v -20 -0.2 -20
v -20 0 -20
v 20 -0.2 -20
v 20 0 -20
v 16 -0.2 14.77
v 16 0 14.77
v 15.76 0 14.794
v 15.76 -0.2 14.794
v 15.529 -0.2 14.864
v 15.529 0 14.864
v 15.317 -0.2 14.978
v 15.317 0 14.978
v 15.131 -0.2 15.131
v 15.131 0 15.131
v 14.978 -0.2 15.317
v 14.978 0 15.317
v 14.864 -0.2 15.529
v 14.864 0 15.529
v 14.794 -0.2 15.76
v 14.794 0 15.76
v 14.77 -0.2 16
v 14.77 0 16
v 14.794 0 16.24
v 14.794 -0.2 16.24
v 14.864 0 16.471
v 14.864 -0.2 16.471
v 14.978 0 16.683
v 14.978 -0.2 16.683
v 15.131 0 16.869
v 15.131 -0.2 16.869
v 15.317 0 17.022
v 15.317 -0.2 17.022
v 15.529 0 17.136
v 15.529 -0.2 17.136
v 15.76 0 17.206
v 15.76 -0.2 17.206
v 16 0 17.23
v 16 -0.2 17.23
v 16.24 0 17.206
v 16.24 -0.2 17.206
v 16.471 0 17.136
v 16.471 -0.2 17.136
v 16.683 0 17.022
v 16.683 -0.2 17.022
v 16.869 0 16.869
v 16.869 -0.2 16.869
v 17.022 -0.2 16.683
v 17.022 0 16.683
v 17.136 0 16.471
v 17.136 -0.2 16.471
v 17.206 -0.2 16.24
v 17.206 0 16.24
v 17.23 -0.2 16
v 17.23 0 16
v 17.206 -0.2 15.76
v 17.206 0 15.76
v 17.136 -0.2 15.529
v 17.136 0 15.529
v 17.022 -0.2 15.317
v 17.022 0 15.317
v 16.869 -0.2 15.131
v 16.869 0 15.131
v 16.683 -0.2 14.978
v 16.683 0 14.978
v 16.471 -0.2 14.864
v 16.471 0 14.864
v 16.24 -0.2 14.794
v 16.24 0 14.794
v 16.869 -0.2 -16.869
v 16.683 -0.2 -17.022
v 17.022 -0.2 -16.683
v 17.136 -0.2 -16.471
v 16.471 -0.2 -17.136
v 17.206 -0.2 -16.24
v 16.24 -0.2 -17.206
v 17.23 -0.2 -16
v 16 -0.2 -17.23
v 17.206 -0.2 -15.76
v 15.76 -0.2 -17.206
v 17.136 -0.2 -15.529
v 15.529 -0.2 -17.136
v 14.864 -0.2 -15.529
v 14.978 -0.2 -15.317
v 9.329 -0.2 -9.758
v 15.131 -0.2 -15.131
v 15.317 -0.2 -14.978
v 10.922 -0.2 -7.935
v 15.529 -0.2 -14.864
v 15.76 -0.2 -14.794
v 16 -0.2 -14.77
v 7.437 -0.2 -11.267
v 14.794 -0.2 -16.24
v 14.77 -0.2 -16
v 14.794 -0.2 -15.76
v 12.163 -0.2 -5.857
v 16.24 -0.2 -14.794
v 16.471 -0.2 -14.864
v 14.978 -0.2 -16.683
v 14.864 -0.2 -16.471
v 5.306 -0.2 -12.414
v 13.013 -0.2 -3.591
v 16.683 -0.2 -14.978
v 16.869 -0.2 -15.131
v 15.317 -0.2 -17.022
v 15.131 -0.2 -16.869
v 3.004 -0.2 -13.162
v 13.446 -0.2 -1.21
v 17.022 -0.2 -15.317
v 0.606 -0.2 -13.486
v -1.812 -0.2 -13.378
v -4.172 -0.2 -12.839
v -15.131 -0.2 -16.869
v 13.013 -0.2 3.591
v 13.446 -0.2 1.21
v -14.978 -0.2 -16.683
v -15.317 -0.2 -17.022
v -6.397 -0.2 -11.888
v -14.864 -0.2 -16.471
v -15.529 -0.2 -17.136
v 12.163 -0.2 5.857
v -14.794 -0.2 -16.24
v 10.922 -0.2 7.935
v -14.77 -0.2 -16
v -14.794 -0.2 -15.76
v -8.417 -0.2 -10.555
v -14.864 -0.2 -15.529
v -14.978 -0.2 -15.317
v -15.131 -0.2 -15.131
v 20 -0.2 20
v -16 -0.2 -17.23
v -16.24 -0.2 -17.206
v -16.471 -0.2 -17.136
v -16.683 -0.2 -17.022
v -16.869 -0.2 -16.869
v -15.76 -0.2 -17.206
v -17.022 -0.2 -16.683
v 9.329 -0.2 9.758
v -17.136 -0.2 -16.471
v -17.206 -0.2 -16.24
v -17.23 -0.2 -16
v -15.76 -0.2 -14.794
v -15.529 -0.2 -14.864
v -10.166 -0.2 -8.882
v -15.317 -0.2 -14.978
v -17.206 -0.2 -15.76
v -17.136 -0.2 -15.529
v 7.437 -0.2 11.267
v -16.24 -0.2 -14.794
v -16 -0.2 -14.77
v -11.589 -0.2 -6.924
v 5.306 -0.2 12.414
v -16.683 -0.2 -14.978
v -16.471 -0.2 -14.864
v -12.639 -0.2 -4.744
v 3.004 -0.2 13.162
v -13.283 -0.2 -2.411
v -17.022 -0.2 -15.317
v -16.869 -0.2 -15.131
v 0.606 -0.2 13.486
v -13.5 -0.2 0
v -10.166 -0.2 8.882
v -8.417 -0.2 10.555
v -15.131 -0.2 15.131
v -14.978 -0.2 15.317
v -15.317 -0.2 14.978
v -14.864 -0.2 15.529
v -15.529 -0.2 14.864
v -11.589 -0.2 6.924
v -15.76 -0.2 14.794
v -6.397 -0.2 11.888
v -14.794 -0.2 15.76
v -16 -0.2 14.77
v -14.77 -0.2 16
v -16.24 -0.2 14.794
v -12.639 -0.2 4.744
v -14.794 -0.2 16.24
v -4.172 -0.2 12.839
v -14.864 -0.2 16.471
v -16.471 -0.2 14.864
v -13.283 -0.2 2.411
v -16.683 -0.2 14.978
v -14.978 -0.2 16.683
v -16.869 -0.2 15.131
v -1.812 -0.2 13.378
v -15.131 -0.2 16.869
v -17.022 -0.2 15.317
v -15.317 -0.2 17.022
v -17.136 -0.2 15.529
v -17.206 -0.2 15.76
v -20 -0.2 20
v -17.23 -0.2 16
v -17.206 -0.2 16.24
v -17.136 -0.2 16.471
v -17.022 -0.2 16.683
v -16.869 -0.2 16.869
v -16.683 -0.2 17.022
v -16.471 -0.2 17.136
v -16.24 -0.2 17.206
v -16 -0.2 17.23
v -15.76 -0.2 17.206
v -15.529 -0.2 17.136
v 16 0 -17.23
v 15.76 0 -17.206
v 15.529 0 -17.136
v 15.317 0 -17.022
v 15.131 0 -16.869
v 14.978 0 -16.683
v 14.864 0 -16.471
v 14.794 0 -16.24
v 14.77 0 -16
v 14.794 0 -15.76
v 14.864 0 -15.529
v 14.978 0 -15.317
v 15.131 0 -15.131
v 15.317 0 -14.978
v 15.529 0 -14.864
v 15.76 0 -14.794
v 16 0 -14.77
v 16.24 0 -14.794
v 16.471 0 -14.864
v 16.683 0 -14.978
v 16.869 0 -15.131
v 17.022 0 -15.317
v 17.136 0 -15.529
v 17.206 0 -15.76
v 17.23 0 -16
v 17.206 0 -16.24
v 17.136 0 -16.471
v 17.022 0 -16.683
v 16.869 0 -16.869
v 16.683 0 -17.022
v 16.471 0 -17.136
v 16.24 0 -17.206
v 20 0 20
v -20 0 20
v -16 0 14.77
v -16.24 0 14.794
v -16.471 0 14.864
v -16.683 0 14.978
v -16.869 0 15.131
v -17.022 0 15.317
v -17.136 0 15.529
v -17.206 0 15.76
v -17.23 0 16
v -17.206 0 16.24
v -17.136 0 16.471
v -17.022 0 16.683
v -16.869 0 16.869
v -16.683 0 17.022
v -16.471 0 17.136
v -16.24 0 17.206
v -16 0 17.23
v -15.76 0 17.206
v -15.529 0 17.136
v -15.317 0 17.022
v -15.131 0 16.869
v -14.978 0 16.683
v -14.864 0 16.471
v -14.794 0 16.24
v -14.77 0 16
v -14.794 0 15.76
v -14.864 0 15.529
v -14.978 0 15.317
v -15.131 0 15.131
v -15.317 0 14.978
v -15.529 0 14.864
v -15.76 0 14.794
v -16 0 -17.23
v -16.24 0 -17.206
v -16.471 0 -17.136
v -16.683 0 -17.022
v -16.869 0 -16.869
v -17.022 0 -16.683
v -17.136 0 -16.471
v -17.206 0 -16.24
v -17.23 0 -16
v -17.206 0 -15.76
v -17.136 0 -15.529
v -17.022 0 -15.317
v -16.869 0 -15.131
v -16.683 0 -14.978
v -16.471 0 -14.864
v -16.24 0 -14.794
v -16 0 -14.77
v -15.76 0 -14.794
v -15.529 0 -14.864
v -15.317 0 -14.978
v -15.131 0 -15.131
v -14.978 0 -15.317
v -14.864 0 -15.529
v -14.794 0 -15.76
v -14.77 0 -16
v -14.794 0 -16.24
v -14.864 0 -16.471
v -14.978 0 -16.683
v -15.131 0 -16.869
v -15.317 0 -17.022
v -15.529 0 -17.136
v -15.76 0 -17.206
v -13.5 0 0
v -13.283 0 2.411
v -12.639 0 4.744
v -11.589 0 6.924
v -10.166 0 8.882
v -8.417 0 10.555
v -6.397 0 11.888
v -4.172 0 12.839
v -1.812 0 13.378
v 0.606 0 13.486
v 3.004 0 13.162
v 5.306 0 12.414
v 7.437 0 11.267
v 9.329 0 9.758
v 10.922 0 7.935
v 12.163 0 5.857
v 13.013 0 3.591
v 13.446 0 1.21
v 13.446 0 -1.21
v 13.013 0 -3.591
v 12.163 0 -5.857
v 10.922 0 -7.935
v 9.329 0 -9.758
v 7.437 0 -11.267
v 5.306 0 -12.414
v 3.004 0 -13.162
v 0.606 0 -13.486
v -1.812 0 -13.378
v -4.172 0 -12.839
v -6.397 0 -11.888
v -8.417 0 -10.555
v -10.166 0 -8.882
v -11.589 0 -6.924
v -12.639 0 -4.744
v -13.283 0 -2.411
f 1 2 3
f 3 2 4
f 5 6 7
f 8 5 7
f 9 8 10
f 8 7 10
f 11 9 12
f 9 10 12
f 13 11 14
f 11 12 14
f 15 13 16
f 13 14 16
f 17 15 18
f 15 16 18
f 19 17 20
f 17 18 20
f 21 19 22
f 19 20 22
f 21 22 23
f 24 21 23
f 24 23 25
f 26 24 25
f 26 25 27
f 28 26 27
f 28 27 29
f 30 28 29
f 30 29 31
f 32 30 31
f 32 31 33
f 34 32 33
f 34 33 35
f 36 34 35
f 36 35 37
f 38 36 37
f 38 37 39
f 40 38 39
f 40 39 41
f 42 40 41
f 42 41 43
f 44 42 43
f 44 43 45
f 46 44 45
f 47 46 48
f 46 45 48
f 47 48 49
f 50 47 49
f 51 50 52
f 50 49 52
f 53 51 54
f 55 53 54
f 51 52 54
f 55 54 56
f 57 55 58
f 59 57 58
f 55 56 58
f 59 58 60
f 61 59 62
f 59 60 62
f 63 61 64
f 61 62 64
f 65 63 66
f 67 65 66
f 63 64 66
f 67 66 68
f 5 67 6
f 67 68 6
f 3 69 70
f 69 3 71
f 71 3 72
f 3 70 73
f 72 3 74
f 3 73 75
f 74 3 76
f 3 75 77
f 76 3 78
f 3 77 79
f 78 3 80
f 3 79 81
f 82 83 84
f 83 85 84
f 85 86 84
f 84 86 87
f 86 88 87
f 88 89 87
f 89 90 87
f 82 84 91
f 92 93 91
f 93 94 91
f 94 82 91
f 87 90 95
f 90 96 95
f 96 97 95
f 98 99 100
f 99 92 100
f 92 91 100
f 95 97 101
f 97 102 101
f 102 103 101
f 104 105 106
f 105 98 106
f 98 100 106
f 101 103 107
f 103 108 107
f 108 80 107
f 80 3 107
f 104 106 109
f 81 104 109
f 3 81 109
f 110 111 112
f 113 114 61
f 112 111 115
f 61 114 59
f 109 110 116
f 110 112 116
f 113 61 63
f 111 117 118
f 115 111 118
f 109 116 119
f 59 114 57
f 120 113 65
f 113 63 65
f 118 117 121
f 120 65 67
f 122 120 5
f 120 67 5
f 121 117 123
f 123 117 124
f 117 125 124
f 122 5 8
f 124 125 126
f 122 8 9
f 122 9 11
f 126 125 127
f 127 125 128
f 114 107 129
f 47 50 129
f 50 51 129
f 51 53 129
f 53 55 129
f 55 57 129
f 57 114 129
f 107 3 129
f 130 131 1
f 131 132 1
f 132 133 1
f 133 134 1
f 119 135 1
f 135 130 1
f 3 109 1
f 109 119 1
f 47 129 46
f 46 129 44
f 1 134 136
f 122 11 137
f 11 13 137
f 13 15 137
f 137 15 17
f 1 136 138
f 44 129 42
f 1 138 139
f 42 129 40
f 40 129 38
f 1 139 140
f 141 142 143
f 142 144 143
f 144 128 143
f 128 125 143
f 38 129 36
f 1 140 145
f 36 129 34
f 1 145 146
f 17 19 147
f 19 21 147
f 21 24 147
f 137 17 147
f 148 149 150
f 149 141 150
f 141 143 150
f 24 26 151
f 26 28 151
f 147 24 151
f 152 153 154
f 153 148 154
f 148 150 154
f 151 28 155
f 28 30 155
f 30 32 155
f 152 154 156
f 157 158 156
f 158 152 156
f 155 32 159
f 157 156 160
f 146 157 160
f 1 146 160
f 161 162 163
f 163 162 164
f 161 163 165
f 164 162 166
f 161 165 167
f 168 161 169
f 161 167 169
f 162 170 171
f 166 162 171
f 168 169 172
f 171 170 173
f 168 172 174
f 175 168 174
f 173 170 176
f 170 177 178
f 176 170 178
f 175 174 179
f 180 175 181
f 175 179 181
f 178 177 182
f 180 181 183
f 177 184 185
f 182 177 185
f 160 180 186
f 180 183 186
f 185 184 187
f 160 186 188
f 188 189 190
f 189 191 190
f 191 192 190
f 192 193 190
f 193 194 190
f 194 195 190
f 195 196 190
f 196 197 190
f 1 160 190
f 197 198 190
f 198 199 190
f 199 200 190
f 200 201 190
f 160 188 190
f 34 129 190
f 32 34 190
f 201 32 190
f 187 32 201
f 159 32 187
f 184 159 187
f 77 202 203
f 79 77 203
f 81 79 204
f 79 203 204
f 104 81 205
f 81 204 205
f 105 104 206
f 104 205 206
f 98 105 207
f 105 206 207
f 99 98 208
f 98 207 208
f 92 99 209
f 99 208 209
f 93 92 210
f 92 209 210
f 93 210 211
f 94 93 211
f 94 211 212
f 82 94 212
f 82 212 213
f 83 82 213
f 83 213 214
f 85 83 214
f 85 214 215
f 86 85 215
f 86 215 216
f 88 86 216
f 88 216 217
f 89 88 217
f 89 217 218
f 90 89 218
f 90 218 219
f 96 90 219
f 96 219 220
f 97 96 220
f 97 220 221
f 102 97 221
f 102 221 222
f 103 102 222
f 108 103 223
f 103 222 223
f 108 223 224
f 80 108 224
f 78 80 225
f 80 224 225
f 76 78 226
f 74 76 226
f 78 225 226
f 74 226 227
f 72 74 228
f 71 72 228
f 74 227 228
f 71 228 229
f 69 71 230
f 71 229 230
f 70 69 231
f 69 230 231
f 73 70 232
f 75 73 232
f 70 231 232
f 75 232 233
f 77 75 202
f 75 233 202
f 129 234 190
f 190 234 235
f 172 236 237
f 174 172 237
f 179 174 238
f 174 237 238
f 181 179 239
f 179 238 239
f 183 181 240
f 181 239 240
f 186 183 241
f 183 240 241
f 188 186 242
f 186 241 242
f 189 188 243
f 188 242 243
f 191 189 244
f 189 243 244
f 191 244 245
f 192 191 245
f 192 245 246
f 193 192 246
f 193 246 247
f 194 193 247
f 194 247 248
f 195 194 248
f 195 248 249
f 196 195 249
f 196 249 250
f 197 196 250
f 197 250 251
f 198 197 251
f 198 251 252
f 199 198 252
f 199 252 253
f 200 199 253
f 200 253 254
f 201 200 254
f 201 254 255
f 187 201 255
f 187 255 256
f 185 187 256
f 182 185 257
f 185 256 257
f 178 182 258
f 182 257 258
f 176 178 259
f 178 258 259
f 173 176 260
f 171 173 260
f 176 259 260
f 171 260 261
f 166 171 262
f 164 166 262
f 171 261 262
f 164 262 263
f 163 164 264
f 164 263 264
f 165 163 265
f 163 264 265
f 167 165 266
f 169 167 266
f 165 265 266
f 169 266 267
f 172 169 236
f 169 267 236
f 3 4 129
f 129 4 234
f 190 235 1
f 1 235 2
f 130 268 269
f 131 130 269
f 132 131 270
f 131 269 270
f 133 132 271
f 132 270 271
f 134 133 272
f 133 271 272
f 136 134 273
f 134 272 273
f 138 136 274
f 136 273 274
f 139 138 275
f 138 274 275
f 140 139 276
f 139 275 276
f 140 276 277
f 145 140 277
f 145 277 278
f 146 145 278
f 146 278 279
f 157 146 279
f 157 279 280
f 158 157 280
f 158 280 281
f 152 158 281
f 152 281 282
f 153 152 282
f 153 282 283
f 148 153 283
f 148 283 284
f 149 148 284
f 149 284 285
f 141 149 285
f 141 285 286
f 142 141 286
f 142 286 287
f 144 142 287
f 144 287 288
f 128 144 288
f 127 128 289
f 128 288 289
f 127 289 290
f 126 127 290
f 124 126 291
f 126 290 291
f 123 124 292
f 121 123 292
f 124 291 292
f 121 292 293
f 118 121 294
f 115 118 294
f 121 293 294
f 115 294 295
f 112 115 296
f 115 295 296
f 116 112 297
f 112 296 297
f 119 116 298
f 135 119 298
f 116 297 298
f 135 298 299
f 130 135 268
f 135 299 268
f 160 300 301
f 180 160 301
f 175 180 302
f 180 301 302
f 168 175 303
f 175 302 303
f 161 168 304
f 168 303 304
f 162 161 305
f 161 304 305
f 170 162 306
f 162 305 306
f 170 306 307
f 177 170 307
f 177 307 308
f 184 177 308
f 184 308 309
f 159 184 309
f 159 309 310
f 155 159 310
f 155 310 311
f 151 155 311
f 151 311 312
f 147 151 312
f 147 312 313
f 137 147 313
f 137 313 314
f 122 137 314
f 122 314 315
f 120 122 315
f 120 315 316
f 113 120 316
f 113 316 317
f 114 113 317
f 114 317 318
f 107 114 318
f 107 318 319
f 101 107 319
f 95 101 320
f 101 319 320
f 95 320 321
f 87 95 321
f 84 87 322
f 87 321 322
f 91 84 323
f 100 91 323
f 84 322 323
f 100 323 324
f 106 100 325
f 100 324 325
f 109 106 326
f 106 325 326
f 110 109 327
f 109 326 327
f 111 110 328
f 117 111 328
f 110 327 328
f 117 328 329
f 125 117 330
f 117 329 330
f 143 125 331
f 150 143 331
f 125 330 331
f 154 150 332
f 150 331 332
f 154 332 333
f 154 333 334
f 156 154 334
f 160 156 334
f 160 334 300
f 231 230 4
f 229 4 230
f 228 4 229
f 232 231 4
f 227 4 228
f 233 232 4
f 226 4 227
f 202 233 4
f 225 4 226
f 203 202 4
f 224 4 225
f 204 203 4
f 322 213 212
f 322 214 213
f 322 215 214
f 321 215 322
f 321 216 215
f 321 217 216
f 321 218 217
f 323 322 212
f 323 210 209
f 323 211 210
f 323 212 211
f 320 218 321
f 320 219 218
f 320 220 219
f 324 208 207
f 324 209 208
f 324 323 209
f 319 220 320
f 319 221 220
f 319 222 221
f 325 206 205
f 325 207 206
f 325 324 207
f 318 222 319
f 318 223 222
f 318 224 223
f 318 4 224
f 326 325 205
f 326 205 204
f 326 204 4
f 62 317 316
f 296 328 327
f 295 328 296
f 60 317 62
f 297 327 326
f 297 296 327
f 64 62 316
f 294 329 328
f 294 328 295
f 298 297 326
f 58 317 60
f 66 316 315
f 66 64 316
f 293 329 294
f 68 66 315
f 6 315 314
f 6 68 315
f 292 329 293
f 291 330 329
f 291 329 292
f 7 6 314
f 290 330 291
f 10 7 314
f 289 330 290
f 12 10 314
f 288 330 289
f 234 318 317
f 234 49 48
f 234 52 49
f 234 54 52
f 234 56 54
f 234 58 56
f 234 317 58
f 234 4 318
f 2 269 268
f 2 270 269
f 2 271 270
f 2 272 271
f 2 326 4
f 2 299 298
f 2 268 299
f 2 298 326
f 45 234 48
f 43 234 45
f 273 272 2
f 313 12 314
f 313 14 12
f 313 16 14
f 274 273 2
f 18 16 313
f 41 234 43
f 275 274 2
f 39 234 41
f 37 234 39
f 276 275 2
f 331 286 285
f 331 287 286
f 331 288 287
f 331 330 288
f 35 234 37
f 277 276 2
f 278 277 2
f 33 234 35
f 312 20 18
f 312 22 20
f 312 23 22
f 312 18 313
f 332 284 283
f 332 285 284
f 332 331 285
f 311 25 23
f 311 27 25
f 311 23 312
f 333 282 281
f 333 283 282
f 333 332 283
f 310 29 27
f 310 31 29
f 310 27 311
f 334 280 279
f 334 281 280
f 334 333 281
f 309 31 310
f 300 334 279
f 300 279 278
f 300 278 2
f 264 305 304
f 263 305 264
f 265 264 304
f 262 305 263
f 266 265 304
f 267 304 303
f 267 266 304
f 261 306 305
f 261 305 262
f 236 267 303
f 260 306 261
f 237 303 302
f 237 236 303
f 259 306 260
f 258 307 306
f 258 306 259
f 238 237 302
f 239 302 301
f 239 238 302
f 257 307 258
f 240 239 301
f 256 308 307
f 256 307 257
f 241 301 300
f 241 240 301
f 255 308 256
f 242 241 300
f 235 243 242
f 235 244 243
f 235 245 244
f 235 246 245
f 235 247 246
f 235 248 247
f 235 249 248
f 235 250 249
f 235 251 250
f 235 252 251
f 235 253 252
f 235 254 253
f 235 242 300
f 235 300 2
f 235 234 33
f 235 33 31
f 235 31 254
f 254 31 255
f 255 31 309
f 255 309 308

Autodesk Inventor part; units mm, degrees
ref_plane "YZ Plane" through (0, 0, 0) normal (1, 0, 0) x (0, 1, 0)
ref_plane "XZ Plane" through (0, 0, 0) normal (0, 1, 0) x (-1, 0, 0)
ref_plane "XY Plane" through (0, 0, 0) normal (0, 0, 1) x (1, 0, 0)
sketch "Skizze1" plane through (0, 0, 0) normal (0, 1, 0) x (-1, 0, 0)
  line L0 (-20, 20) -> (20, 20)
  line L1 (20, 20) -> (20, -20)
  line L2 (20, -20) -> (-20, -20)
  line L3 (-20, -20) -> (-20, 20)
  circle A0 centre (0, 0) radius 13.5
  dimension "d0" = 40
  dimension "d1" = 40
  dimension "d2" = 27
  dimension "d16" = 20
extrude "Extrusion1" add sketch "Skizze1" against normal blind 0.2
sketch "Skizze2" plane through (0, -0.2, 0) normal (0, -1, 0) x (1, 0, 0)
  point P0 (0, 0)
  point P1 (-16, -16)
  point P2 (-16, 16)
  point P3 (16, -16)
  point P4 (16, 16)
  dimension "d12" = 32
  dimension "d13" = 16
  dimension "d14" = 32
  dimension "d15" = 16
hole "Bohrung1" at (-16, -0.2, -16) at (-16, -0.2, 16) at (16, -0.2, -16) at (16, -0.2, 16) direction (0, 1, 0) diameter 2.459 depth 0.2 thread size "M3x0.5" class "6H" standard "ISO Metric profile"
properties part number "zylinderfussdichtung"
